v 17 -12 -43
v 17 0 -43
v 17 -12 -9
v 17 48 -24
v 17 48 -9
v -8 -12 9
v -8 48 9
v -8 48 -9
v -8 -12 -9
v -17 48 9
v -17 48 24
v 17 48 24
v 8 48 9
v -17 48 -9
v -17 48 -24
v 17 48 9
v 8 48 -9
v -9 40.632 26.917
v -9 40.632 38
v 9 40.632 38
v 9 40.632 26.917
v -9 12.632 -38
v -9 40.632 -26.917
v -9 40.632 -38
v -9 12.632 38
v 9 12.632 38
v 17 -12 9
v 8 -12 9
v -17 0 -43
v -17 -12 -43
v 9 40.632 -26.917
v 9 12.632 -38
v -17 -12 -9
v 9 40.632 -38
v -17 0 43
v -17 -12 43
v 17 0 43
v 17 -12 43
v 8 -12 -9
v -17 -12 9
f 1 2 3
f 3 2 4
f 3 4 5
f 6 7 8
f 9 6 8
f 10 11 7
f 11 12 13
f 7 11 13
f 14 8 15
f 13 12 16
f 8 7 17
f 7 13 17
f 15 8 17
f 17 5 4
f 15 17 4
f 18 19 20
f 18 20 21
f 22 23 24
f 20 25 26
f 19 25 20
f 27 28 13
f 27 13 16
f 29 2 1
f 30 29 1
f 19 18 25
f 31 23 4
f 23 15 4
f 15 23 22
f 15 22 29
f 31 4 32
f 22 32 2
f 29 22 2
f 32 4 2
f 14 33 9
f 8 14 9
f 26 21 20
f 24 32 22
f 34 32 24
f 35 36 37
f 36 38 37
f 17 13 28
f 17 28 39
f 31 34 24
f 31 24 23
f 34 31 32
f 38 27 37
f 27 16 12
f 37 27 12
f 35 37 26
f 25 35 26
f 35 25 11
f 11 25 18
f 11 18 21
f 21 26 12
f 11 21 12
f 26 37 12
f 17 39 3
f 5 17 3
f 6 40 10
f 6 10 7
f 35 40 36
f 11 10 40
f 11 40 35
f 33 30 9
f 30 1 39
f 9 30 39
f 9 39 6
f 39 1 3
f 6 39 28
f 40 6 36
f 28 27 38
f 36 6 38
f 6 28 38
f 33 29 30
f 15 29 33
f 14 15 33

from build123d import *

# Parameters (mm, degrees)
SALIENTE_EXTRUIR2_DEPTH = 17
CROQUIS3_W              = 9
CROQUIS3_H              = 18
CORTAR_EXTRUIR2_DEPTH   = 76.749587458
SALIENTE_EXTRUIR4_DEPTH = 9


with BuildPart() as part:
    # Croquis1 → Saliente-Extruir2 (new, symmetric)
    with BuildSketch(Plane(origin=(0, 0, 0), x_dir=(0, 0, -1), z_dir=(1, 0, 0))):
        Polygon((43, -12), (-43, -12), (-43, 0), (-24, 48), (24, 48), (43, 0), align=None)
    extrude(amount=SALIENTE_EXTRUIR2_DEPTH, both=True)

    # Croquis3 → Cortar-Extruir2 (cut, through all)
    with BuildSketch(Plane(origin=(0, 48, 0), x_dir=(1, 0, 0), z_dir=(0, 1, 0))):
        with Locations((-12.5, 0)):
            Rectangle(CROQUIS3_W, CROQUIS3_H)
        with Locations((12.5, 0)):
            Rectangle(CROQUIS3_W, CROQUIS3_H)
    extrude(amount=-CORTAR_EXTRUIR2_DEPTH, mode=Mode.SUBTRACT)

    # Croquis4 → Saliente-Extruir4 (add, symmetric)
    with BuildSketch(Plane(origin=(0, 0, 0), x_dir=(0, 0, -1), z_dir=(1, 0, 0))):
        Polygon((-38, 12.631578947), (-38, 40.631578947), (-26.916666667, 40.631578947), align=None)
        Polygon((38, 12.631578947), (38, 40.631578947), (26.916666667, 40.631578947), align=None)
    extrude(amount=SALIENTE_EXTRUIR4_DEPTH, both=True)


solid = part.part
